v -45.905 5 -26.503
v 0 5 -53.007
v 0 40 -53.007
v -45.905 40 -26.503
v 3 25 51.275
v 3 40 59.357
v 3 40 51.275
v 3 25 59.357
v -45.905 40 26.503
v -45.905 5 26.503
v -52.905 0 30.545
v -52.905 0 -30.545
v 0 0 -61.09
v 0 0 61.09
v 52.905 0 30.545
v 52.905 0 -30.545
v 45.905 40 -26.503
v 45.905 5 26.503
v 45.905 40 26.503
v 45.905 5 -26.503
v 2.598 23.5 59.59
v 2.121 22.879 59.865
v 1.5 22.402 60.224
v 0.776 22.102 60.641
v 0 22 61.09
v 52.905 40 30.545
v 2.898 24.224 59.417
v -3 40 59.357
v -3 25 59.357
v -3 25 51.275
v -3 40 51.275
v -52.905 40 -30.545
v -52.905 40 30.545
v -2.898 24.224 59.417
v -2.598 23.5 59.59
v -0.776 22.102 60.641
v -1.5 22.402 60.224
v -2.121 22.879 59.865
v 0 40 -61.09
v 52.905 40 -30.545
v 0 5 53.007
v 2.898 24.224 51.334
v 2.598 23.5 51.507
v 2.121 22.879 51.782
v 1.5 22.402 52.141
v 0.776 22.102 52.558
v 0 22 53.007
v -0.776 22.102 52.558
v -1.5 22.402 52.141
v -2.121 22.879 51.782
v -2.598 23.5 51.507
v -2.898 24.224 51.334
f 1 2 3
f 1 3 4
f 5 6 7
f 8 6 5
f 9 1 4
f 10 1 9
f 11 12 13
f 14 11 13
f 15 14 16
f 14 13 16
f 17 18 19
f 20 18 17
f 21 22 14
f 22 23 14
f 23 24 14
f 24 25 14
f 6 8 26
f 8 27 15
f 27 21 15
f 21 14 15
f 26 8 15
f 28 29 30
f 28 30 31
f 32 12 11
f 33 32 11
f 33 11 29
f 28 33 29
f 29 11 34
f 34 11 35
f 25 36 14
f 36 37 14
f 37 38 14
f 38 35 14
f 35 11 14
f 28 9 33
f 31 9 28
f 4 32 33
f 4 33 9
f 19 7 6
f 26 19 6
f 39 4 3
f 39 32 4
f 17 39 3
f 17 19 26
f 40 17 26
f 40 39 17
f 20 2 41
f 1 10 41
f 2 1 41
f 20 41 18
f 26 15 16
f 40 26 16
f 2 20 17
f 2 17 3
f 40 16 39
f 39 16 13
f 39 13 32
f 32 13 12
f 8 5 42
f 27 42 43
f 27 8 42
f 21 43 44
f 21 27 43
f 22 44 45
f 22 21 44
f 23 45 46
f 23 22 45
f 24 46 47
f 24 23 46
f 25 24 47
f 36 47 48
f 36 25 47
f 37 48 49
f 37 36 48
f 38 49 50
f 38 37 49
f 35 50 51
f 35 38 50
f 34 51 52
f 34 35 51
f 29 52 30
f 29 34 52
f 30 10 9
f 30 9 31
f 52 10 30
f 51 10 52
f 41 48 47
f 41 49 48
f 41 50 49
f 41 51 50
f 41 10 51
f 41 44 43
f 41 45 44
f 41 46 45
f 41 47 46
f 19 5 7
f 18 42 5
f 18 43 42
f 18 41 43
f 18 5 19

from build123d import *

# Parameters (mm, degrees)
BOSS_EXTRUDE1_DEPTH = 40
BOSS_EXTRUDE5_DEPTH = 5
CUT_EXTRUDE2_DEPTH  = 19.5


with BuildPart() as part:
    # Sketch2 → Boss-Extrude1 (new body)
    with BuildSketch(Plane(origin=(0, 0, 0), x_dir=(1, 0, 0), z_dir=(0, 1, 0))):
        Polygon((52.905102206, -30.544775), (52.905102206, 30.544775), (0, 61.08955), (-52.905102206, 30.544775), (-52.905102206, -30.544775), (0, -61.08955), align=None)
        Polygon((45.905102206, -26.503323116), (45.905102206, 26.503323116), (0, 53.006646231), (-45.905102206, 26.503323116), (-45.905102206, -26.503323116), (0, -53.006646231), align=None, mode=Mode.SUBTRACT)
    extrude(amount=BOSS_EXTRUDE1_DEPTH)

    # Sketch7 → Boss-Extrude5 (add)
    with BuildSketch(Plane.XZ):
        Polygon((-49.405102206, 28.524049058), (-49.405102206, -28.524049058), (0, -57.048098116), (49.405102206, -28.524049058), (49.405102206, 28.524049058), (0, 57.048098116), align=None)
    extrude(amount=-BOSS_EXTRUDE5_DEPTH)

    # Sketch8 → Cut-Extrude2 (cut, symmetric)
    with BuildSketch(Plane.XY.offset(61)):
        with BuildLine():
            Line((3, 40), (3, 25))
            ThreePointArc((3, 25), (2.121320344, 22.878679656), (0, 22))
            ThreePointArc((0, 22), (-2.121320344, 22.878679656), (-3, 25))
            Line((-3, 25), (-3, 40))
            Line((-3, 40), (0, 40))
            Line((0, 40), (3, 40))
        make_face()
    extrude(amount=CUT_EXTRUDE2_DEPTH, both=True, mode=Mode.SUBTRACT)


solid = part.part
